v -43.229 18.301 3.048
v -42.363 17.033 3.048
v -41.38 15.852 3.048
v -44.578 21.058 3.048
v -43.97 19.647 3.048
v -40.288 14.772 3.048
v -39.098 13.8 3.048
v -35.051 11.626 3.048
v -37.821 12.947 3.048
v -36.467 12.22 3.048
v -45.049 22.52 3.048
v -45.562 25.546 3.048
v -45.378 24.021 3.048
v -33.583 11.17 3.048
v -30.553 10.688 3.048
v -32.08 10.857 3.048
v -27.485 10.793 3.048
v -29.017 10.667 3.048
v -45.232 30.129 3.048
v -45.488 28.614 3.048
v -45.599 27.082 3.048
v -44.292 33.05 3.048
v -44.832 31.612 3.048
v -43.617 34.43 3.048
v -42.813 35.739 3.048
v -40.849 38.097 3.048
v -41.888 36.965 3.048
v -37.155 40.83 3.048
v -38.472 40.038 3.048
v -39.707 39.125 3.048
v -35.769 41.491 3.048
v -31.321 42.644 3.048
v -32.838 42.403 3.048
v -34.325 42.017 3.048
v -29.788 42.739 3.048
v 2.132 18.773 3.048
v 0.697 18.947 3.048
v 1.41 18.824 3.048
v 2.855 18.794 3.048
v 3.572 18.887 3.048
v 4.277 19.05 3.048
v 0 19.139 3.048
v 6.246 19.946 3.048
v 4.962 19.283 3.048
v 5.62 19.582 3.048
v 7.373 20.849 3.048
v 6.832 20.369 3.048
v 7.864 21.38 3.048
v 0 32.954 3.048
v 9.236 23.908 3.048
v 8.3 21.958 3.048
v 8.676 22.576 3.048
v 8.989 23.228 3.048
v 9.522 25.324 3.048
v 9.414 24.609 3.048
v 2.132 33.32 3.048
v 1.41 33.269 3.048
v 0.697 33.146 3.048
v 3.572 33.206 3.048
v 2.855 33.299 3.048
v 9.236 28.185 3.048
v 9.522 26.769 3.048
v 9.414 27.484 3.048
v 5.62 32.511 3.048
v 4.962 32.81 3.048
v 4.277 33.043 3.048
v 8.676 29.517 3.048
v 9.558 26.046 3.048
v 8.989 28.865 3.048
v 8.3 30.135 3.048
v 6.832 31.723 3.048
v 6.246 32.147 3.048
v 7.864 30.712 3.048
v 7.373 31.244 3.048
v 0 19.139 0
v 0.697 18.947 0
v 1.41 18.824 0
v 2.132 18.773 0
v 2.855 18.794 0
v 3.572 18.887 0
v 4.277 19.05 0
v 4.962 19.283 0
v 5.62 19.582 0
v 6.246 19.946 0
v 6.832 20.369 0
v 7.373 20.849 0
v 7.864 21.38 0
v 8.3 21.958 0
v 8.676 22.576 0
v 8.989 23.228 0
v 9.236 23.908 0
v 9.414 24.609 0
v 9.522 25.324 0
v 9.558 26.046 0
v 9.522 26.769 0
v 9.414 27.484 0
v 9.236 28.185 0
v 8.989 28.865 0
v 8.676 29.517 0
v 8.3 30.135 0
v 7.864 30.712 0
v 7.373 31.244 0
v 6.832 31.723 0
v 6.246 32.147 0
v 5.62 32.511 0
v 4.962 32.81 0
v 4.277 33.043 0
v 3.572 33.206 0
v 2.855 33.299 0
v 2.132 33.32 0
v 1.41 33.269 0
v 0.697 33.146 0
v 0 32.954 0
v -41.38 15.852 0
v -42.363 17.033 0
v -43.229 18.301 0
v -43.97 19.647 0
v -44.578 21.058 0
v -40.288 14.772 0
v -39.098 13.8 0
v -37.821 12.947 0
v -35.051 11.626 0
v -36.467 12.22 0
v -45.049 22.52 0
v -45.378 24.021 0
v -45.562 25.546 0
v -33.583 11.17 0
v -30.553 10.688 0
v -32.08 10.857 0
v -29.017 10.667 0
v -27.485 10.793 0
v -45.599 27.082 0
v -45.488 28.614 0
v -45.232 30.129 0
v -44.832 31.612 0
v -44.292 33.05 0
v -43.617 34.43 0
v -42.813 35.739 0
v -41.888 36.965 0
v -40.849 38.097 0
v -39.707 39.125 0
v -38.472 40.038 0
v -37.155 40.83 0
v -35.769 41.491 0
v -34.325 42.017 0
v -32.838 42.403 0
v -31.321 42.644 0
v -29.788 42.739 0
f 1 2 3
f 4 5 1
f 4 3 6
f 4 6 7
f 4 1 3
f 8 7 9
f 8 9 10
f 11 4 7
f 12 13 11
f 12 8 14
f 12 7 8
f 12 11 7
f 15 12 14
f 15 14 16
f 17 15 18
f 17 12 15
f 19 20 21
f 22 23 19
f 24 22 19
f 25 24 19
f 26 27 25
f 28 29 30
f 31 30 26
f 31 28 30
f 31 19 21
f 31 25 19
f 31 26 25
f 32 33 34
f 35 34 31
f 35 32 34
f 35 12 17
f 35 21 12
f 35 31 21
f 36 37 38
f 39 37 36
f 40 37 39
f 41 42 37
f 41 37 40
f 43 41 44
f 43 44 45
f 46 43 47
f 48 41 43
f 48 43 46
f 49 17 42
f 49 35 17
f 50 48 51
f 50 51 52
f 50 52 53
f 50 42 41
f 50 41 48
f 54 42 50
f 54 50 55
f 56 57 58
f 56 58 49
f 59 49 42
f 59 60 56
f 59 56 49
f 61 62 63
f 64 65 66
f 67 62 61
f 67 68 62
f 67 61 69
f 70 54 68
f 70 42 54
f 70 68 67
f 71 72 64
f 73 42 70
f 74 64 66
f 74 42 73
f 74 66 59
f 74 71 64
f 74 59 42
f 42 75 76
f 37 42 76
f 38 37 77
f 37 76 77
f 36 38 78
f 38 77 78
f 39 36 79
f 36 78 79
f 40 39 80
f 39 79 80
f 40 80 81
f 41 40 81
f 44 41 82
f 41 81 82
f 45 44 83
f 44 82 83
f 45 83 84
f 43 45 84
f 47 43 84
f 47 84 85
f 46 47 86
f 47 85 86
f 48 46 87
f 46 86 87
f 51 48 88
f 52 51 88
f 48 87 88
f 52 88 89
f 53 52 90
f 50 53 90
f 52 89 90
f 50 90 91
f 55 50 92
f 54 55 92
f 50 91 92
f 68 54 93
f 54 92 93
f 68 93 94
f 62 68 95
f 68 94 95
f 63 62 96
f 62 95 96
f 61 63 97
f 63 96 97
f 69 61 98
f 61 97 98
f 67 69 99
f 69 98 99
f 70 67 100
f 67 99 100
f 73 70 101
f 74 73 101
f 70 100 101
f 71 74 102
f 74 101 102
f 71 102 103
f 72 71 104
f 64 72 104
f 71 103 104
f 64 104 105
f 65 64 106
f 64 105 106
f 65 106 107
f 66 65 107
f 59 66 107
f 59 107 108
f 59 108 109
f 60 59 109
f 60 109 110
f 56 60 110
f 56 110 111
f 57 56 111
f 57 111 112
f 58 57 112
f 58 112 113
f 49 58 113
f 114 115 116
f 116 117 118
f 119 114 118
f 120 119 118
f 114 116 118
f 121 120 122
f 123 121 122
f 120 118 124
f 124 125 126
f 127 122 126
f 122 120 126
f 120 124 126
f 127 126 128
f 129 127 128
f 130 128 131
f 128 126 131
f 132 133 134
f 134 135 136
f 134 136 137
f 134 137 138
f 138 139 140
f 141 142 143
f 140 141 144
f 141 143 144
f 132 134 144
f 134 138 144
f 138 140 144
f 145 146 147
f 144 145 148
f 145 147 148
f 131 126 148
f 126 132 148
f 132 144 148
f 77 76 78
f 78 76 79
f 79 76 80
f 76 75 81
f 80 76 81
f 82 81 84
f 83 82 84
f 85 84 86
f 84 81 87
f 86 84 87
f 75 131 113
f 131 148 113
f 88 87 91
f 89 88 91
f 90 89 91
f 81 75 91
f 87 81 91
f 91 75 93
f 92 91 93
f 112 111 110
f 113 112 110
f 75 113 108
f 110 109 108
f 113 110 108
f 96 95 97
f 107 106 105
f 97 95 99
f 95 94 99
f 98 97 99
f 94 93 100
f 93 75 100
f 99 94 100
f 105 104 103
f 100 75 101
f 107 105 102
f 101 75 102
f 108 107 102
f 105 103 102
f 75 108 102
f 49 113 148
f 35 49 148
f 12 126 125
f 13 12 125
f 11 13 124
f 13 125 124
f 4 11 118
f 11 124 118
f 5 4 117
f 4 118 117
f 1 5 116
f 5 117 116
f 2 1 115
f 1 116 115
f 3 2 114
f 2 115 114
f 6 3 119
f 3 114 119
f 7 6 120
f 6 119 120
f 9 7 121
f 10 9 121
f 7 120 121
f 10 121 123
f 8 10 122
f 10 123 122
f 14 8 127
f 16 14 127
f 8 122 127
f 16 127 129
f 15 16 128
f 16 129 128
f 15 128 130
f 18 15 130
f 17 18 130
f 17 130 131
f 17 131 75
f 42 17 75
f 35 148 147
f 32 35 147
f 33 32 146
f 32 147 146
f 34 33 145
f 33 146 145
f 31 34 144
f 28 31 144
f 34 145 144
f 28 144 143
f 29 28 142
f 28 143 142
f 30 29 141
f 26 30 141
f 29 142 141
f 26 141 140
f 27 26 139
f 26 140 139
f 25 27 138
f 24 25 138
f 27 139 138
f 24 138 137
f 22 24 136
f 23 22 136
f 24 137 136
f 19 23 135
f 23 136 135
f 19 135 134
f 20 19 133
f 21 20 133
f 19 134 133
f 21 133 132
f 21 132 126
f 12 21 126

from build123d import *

# Parameters (mm, degrees)
F1_DEPTH = 3.048


with BuildPart() as f1:
    # F0 (on Top) → F1 (new body)
    with BuildSketch(Plane.XY):
        with BuildLine():
            Line((-27.485451, 10.792716), (-29.787896, 42.739153))
            ThreePointArc((-29.787896, 42.739153), (-41.382102, 37.543924), (-45.561652, 25.546117))
            ThreePointArc((-45.561652, 25.546117), (-39.704821, 14.271652), (-27.485451, 10.792716))
        make_face()
        Polygon((0, 32.953762), (-29.787896, 42.739153), (-27.485451, 10.792716), (0, 19.139083), align=None)
        with BuildLine():
            ThreePointArc((0, 19.139083), (9.557615, 26.046422), (0, 32.953762))
            Line((0, 32.953762), (0, 19.139083))
        make_face()
    extrude(amount=F1_DEPTH)


solid = f1.part
